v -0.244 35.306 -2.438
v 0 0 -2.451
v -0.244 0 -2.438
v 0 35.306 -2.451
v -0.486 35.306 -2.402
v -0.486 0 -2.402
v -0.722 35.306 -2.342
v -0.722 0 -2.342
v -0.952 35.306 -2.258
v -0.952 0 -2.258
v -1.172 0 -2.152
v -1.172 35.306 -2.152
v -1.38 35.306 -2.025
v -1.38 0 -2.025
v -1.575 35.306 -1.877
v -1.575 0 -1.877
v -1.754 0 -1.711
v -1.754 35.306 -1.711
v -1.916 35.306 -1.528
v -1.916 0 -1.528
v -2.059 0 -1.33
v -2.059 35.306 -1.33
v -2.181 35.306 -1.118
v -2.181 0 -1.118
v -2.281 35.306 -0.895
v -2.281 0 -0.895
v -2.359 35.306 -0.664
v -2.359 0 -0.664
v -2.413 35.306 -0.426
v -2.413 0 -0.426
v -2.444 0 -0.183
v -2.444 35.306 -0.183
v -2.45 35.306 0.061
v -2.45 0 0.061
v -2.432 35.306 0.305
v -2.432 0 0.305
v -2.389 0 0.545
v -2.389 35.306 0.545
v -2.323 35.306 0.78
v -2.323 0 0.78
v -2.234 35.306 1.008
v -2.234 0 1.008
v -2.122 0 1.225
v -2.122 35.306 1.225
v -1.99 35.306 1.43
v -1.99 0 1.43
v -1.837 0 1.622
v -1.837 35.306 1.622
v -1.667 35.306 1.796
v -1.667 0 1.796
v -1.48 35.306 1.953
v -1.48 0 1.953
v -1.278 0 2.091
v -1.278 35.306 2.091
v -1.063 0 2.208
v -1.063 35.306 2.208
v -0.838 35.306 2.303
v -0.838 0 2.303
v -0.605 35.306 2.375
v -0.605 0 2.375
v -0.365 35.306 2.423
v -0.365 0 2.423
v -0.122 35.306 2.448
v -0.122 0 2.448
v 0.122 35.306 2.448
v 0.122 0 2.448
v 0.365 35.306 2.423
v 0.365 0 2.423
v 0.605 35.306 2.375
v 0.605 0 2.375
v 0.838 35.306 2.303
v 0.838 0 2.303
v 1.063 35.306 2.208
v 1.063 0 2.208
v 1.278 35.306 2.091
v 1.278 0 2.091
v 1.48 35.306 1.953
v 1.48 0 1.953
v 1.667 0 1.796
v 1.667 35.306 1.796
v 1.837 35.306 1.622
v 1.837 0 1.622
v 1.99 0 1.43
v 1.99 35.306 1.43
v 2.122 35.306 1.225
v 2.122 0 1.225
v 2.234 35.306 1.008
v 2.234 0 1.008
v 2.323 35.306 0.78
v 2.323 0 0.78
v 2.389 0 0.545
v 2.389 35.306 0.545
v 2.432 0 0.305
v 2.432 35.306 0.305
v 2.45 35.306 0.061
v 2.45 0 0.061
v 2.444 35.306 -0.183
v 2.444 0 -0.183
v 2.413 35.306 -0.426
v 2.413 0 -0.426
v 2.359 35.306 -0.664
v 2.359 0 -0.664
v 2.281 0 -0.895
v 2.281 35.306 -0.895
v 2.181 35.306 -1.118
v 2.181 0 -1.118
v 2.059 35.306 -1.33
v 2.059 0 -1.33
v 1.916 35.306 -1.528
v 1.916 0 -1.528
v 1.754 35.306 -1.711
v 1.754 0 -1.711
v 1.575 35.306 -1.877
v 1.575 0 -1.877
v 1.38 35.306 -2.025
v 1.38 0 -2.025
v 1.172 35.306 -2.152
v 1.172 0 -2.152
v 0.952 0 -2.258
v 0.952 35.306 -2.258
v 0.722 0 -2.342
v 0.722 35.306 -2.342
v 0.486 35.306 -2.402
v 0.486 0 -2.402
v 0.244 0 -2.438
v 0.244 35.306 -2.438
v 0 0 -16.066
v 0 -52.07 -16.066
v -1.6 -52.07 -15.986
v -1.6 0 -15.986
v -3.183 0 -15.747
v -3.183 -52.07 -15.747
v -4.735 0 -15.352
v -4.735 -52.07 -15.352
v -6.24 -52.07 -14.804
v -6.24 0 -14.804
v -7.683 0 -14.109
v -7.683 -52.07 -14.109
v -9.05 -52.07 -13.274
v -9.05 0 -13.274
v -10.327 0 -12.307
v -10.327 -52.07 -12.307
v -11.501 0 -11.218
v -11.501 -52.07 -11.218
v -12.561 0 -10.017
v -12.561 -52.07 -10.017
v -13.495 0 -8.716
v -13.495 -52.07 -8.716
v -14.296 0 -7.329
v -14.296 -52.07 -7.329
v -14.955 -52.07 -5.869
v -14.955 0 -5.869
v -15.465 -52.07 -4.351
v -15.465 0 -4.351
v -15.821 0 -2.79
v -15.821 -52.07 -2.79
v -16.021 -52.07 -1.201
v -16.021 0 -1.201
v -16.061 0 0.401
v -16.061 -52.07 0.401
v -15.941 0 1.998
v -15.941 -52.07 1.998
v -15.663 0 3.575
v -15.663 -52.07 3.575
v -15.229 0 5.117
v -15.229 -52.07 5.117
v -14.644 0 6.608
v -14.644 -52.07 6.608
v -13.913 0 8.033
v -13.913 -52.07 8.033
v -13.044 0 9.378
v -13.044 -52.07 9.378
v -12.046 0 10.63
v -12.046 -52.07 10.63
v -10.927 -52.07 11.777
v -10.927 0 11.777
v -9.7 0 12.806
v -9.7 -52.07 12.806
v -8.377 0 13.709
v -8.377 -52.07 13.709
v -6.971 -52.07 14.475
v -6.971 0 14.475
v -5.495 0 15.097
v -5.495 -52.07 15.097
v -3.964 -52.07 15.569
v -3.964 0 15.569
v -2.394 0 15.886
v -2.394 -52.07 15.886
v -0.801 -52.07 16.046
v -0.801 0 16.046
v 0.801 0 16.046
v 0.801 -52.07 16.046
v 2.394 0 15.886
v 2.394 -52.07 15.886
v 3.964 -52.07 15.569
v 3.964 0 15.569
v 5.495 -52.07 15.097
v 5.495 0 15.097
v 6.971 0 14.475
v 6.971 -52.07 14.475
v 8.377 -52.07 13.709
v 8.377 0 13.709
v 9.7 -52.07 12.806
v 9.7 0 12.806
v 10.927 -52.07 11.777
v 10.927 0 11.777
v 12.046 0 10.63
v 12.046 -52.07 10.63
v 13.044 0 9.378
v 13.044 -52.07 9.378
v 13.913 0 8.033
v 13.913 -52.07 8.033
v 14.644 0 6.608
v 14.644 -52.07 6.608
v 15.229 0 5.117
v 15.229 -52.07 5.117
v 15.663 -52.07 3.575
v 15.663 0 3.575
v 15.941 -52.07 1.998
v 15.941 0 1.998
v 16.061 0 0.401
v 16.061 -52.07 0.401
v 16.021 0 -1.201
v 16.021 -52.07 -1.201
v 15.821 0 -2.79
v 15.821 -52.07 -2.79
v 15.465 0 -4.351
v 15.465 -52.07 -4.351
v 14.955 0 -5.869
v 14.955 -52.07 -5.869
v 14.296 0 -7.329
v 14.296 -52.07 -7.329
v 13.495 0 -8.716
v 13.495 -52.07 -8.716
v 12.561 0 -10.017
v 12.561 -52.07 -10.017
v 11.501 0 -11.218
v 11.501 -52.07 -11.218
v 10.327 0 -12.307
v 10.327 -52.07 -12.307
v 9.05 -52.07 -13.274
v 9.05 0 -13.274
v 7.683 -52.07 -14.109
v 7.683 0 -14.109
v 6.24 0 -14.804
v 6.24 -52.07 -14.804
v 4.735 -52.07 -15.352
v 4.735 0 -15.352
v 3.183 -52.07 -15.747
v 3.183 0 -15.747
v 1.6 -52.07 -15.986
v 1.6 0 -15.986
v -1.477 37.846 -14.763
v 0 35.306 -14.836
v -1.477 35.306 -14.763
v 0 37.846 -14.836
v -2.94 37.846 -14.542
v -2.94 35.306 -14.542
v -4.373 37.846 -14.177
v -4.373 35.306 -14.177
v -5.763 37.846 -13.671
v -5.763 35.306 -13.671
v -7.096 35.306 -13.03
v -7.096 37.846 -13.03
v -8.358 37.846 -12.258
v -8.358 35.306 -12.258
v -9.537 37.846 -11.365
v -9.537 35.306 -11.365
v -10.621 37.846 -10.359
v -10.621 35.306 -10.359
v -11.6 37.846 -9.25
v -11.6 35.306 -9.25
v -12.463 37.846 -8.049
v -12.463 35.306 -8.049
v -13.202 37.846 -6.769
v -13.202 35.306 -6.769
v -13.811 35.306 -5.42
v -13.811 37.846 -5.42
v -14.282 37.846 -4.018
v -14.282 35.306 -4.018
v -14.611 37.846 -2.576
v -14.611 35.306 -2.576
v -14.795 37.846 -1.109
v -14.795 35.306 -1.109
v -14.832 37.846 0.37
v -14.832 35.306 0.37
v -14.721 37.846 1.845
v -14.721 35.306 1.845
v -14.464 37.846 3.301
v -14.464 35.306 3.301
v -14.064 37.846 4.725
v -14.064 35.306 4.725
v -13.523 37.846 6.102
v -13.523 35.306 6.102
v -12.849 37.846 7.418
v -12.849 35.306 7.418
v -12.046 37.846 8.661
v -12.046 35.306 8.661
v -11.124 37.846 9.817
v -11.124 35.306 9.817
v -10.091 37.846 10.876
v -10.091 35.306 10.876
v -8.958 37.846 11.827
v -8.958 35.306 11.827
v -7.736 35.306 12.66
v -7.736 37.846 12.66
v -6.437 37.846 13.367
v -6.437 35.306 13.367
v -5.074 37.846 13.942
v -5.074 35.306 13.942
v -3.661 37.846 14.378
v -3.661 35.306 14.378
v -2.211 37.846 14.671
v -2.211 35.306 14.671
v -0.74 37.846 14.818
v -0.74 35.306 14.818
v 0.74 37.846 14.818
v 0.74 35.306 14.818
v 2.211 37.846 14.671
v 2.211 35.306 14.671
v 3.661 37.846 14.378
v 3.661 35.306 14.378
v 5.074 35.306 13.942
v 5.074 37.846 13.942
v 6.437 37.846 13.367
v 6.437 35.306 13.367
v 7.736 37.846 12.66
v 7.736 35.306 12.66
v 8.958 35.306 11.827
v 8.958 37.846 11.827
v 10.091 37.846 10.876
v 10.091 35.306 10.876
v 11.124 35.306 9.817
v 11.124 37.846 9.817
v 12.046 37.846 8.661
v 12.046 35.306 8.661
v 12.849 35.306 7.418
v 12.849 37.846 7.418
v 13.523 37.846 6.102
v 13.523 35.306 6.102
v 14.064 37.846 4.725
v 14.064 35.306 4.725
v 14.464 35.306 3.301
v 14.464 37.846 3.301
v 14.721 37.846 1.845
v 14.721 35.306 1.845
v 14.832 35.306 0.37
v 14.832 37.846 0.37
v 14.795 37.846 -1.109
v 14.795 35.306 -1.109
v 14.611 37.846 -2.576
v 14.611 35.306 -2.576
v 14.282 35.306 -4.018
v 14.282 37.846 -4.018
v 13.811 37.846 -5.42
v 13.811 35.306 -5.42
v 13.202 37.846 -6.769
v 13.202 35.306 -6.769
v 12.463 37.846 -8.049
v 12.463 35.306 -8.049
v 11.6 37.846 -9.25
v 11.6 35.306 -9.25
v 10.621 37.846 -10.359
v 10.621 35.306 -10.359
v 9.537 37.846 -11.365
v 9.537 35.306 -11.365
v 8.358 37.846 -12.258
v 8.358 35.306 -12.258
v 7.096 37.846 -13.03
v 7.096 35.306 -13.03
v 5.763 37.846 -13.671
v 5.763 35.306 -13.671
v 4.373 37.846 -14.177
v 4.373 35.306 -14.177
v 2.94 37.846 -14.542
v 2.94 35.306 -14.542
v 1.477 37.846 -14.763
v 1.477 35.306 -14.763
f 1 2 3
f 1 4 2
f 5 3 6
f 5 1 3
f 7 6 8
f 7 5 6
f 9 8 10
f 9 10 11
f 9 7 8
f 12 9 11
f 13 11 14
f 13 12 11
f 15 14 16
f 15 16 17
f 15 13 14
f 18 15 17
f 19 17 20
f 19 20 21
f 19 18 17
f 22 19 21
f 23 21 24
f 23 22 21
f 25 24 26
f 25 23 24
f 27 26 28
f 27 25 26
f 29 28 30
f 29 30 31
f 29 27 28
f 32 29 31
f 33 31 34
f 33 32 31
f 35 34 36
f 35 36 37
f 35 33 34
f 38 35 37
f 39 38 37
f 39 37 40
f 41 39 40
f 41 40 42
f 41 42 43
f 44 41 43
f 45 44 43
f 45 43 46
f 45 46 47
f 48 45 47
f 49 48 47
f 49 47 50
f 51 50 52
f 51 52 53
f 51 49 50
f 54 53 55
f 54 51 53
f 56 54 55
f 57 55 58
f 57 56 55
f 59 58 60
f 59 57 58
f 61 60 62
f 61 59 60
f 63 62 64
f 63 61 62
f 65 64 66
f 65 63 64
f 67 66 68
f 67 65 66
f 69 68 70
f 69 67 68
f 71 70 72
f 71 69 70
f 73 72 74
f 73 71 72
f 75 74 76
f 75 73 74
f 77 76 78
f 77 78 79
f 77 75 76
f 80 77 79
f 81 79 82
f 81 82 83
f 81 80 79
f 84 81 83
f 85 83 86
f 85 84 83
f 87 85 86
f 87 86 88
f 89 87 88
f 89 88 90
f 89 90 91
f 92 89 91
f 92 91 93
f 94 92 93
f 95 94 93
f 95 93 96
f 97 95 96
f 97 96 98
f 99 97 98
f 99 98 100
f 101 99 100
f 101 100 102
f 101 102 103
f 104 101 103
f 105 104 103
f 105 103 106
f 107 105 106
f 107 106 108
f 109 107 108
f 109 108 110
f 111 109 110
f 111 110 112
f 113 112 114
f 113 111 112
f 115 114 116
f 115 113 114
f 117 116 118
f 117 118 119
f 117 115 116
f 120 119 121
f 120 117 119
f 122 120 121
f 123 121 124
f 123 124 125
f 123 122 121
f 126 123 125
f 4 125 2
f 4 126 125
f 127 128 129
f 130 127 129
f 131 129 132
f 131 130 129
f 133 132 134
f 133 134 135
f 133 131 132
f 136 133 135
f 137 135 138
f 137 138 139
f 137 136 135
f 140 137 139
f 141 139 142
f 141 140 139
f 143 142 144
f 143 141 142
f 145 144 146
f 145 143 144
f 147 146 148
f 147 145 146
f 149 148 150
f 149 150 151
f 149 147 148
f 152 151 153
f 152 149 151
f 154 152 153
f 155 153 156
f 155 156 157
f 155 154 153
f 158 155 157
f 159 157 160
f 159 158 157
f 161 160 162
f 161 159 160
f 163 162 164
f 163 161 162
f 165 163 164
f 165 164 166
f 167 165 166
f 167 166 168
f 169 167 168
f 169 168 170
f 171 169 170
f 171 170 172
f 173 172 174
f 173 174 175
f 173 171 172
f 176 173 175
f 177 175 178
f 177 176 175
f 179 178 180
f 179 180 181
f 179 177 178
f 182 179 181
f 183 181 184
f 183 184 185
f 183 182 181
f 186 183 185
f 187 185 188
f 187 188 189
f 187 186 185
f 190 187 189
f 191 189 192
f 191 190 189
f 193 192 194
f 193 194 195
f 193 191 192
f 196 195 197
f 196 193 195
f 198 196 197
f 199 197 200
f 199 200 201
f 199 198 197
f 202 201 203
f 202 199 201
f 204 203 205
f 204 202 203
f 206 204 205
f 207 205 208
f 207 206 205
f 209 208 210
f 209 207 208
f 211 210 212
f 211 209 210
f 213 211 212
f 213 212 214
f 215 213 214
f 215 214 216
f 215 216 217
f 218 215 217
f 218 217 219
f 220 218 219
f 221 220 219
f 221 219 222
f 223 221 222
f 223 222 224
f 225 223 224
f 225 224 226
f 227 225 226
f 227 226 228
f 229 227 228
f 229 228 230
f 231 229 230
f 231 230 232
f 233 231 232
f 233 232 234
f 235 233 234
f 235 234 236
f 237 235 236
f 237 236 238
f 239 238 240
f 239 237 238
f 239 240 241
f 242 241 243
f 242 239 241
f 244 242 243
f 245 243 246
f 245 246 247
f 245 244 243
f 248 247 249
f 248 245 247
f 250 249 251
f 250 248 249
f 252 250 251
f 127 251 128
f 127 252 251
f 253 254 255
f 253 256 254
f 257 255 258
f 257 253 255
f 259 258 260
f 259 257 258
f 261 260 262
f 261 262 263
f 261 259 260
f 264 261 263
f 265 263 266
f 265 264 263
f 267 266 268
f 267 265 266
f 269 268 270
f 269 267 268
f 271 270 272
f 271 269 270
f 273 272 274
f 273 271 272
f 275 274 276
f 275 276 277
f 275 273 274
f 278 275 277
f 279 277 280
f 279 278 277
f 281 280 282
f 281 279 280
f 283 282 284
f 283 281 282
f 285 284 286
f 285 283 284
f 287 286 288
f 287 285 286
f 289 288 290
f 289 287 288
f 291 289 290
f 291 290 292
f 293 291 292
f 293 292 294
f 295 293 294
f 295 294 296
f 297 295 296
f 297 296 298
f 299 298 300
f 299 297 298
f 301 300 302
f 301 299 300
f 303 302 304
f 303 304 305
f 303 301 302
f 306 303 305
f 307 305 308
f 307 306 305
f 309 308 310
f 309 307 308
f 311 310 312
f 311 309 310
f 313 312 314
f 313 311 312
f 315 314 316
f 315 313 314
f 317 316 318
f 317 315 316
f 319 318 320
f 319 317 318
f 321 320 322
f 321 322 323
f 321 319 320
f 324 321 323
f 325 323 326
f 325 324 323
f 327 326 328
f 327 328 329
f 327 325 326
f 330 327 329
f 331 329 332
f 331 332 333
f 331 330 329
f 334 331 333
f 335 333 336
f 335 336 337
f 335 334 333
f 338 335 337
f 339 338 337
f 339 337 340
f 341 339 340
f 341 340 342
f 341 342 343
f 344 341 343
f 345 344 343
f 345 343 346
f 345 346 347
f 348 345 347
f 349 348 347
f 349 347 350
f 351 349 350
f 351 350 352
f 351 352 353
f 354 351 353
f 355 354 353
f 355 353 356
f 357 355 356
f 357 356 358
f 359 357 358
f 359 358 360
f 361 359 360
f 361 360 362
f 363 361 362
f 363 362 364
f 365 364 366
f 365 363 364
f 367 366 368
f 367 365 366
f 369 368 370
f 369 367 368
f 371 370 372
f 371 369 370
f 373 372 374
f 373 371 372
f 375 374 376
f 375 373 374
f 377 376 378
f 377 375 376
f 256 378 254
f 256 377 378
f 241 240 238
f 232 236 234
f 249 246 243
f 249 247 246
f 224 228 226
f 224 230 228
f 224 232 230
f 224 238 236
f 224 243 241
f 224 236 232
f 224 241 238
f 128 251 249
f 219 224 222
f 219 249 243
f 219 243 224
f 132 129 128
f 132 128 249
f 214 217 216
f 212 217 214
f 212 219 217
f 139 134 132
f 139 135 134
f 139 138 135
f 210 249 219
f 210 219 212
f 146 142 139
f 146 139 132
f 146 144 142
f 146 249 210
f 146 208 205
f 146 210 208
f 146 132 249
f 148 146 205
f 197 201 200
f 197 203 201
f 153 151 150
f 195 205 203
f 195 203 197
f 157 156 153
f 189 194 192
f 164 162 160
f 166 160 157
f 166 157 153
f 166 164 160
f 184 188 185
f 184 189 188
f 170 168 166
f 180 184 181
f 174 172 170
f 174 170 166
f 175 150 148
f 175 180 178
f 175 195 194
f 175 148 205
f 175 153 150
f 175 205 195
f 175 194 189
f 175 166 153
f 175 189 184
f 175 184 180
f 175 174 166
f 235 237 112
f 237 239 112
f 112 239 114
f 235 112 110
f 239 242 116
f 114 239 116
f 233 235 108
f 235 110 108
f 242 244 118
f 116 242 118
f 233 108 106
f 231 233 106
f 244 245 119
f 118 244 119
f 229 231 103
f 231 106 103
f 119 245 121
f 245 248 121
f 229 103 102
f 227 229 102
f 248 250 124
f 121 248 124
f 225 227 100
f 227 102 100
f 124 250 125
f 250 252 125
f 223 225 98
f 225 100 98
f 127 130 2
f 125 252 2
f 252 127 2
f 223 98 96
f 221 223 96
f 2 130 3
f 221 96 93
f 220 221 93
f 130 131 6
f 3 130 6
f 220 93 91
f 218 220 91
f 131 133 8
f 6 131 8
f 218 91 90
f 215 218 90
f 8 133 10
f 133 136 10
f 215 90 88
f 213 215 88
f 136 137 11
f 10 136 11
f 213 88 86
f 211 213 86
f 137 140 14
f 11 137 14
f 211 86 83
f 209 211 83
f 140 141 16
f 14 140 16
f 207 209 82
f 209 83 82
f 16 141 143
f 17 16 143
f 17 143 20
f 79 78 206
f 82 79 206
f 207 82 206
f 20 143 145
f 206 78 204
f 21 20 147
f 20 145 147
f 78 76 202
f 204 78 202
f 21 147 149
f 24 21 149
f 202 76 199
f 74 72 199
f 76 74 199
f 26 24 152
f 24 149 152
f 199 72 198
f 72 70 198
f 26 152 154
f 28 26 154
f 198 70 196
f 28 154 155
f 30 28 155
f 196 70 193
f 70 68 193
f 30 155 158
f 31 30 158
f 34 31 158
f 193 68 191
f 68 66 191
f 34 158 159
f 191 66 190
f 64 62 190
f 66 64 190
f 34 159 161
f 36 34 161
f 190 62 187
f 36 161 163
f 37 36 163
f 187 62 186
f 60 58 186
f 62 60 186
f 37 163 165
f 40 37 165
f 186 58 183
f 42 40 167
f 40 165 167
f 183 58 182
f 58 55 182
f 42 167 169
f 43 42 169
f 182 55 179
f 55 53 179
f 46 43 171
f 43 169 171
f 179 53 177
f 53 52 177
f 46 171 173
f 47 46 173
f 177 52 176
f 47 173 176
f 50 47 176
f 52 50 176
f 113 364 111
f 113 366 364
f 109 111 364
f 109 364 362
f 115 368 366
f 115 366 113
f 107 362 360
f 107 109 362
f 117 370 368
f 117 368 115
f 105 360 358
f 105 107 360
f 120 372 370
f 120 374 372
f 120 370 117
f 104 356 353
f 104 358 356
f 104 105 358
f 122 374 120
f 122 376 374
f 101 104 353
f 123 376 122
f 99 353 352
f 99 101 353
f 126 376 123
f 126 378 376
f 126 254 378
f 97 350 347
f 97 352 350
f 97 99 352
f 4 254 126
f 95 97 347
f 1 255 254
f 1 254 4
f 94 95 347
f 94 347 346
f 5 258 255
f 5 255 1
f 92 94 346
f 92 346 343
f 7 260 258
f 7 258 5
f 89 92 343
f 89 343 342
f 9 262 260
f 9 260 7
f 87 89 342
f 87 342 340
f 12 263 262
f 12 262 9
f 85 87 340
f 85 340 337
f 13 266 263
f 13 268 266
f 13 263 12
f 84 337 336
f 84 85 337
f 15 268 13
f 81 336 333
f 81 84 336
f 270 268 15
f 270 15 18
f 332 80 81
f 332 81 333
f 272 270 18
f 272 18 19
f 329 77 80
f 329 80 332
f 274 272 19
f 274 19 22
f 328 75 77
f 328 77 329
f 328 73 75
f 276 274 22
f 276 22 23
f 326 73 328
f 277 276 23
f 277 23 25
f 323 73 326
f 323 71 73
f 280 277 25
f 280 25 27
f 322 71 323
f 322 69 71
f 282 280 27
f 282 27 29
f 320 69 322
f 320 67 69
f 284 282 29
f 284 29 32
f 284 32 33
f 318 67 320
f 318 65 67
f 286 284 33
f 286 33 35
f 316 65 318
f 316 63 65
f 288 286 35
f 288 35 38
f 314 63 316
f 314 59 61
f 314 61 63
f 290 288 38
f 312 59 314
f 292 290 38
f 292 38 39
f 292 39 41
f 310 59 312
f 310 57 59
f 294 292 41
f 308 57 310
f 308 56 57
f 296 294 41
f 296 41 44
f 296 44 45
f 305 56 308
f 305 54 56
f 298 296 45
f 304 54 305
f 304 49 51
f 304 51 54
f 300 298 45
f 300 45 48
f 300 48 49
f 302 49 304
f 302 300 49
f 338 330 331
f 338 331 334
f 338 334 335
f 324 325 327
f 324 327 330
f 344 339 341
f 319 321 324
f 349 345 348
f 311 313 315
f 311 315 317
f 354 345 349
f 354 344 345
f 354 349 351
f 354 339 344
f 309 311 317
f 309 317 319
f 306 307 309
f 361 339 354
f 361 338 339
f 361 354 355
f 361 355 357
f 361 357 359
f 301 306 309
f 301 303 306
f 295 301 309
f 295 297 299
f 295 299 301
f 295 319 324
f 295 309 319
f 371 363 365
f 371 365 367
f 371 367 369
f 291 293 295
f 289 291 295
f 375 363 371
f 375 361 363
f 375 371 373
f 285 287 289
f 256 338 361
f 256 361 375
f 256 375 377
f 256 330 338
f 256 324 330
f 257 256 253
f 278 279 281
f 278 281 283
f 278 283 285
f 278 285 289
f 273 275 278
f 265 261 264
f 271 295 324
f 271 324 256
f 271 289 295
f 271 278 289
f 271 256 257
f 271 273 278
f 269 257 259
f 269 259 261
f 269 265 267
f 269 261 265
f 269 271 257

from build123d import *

# Parameters (mm, degrees)
SKETCH1_W   = 16.0655
SKETCH1_H   = 52.07
SKETCH1_W_2 = 2.450561434
SKETCH1_H_2 = 35.306


with BuildPart() as part:
    # Sketch1 → Revolve1 (revolve)
    with BuildSketch(Plane.XY, mode=Mode.PRIVATE) as revolve1_sk:
        with Locations((8.03275, -26.035)):
            Rectangle(SKETCH1_W, SKETCH1_H)
        with Locations((1.225280717, 17.653)):
            Rectangle(SKETCH1_W_2, SKETCH1_H_2)
        Polygon((0, 37.846), (0, 35.306), (2.450561434, 35.306), (14.836359841, 35.306), (14.836359841, 37.846), align=None)
    revolve(revolve1_sk.sketch.rotate(Axis((0, 0, 0), (0, 1, 0)), 90), axis=Axis((0, 0, 0), (0, 1, 0)))


solid = part.part
